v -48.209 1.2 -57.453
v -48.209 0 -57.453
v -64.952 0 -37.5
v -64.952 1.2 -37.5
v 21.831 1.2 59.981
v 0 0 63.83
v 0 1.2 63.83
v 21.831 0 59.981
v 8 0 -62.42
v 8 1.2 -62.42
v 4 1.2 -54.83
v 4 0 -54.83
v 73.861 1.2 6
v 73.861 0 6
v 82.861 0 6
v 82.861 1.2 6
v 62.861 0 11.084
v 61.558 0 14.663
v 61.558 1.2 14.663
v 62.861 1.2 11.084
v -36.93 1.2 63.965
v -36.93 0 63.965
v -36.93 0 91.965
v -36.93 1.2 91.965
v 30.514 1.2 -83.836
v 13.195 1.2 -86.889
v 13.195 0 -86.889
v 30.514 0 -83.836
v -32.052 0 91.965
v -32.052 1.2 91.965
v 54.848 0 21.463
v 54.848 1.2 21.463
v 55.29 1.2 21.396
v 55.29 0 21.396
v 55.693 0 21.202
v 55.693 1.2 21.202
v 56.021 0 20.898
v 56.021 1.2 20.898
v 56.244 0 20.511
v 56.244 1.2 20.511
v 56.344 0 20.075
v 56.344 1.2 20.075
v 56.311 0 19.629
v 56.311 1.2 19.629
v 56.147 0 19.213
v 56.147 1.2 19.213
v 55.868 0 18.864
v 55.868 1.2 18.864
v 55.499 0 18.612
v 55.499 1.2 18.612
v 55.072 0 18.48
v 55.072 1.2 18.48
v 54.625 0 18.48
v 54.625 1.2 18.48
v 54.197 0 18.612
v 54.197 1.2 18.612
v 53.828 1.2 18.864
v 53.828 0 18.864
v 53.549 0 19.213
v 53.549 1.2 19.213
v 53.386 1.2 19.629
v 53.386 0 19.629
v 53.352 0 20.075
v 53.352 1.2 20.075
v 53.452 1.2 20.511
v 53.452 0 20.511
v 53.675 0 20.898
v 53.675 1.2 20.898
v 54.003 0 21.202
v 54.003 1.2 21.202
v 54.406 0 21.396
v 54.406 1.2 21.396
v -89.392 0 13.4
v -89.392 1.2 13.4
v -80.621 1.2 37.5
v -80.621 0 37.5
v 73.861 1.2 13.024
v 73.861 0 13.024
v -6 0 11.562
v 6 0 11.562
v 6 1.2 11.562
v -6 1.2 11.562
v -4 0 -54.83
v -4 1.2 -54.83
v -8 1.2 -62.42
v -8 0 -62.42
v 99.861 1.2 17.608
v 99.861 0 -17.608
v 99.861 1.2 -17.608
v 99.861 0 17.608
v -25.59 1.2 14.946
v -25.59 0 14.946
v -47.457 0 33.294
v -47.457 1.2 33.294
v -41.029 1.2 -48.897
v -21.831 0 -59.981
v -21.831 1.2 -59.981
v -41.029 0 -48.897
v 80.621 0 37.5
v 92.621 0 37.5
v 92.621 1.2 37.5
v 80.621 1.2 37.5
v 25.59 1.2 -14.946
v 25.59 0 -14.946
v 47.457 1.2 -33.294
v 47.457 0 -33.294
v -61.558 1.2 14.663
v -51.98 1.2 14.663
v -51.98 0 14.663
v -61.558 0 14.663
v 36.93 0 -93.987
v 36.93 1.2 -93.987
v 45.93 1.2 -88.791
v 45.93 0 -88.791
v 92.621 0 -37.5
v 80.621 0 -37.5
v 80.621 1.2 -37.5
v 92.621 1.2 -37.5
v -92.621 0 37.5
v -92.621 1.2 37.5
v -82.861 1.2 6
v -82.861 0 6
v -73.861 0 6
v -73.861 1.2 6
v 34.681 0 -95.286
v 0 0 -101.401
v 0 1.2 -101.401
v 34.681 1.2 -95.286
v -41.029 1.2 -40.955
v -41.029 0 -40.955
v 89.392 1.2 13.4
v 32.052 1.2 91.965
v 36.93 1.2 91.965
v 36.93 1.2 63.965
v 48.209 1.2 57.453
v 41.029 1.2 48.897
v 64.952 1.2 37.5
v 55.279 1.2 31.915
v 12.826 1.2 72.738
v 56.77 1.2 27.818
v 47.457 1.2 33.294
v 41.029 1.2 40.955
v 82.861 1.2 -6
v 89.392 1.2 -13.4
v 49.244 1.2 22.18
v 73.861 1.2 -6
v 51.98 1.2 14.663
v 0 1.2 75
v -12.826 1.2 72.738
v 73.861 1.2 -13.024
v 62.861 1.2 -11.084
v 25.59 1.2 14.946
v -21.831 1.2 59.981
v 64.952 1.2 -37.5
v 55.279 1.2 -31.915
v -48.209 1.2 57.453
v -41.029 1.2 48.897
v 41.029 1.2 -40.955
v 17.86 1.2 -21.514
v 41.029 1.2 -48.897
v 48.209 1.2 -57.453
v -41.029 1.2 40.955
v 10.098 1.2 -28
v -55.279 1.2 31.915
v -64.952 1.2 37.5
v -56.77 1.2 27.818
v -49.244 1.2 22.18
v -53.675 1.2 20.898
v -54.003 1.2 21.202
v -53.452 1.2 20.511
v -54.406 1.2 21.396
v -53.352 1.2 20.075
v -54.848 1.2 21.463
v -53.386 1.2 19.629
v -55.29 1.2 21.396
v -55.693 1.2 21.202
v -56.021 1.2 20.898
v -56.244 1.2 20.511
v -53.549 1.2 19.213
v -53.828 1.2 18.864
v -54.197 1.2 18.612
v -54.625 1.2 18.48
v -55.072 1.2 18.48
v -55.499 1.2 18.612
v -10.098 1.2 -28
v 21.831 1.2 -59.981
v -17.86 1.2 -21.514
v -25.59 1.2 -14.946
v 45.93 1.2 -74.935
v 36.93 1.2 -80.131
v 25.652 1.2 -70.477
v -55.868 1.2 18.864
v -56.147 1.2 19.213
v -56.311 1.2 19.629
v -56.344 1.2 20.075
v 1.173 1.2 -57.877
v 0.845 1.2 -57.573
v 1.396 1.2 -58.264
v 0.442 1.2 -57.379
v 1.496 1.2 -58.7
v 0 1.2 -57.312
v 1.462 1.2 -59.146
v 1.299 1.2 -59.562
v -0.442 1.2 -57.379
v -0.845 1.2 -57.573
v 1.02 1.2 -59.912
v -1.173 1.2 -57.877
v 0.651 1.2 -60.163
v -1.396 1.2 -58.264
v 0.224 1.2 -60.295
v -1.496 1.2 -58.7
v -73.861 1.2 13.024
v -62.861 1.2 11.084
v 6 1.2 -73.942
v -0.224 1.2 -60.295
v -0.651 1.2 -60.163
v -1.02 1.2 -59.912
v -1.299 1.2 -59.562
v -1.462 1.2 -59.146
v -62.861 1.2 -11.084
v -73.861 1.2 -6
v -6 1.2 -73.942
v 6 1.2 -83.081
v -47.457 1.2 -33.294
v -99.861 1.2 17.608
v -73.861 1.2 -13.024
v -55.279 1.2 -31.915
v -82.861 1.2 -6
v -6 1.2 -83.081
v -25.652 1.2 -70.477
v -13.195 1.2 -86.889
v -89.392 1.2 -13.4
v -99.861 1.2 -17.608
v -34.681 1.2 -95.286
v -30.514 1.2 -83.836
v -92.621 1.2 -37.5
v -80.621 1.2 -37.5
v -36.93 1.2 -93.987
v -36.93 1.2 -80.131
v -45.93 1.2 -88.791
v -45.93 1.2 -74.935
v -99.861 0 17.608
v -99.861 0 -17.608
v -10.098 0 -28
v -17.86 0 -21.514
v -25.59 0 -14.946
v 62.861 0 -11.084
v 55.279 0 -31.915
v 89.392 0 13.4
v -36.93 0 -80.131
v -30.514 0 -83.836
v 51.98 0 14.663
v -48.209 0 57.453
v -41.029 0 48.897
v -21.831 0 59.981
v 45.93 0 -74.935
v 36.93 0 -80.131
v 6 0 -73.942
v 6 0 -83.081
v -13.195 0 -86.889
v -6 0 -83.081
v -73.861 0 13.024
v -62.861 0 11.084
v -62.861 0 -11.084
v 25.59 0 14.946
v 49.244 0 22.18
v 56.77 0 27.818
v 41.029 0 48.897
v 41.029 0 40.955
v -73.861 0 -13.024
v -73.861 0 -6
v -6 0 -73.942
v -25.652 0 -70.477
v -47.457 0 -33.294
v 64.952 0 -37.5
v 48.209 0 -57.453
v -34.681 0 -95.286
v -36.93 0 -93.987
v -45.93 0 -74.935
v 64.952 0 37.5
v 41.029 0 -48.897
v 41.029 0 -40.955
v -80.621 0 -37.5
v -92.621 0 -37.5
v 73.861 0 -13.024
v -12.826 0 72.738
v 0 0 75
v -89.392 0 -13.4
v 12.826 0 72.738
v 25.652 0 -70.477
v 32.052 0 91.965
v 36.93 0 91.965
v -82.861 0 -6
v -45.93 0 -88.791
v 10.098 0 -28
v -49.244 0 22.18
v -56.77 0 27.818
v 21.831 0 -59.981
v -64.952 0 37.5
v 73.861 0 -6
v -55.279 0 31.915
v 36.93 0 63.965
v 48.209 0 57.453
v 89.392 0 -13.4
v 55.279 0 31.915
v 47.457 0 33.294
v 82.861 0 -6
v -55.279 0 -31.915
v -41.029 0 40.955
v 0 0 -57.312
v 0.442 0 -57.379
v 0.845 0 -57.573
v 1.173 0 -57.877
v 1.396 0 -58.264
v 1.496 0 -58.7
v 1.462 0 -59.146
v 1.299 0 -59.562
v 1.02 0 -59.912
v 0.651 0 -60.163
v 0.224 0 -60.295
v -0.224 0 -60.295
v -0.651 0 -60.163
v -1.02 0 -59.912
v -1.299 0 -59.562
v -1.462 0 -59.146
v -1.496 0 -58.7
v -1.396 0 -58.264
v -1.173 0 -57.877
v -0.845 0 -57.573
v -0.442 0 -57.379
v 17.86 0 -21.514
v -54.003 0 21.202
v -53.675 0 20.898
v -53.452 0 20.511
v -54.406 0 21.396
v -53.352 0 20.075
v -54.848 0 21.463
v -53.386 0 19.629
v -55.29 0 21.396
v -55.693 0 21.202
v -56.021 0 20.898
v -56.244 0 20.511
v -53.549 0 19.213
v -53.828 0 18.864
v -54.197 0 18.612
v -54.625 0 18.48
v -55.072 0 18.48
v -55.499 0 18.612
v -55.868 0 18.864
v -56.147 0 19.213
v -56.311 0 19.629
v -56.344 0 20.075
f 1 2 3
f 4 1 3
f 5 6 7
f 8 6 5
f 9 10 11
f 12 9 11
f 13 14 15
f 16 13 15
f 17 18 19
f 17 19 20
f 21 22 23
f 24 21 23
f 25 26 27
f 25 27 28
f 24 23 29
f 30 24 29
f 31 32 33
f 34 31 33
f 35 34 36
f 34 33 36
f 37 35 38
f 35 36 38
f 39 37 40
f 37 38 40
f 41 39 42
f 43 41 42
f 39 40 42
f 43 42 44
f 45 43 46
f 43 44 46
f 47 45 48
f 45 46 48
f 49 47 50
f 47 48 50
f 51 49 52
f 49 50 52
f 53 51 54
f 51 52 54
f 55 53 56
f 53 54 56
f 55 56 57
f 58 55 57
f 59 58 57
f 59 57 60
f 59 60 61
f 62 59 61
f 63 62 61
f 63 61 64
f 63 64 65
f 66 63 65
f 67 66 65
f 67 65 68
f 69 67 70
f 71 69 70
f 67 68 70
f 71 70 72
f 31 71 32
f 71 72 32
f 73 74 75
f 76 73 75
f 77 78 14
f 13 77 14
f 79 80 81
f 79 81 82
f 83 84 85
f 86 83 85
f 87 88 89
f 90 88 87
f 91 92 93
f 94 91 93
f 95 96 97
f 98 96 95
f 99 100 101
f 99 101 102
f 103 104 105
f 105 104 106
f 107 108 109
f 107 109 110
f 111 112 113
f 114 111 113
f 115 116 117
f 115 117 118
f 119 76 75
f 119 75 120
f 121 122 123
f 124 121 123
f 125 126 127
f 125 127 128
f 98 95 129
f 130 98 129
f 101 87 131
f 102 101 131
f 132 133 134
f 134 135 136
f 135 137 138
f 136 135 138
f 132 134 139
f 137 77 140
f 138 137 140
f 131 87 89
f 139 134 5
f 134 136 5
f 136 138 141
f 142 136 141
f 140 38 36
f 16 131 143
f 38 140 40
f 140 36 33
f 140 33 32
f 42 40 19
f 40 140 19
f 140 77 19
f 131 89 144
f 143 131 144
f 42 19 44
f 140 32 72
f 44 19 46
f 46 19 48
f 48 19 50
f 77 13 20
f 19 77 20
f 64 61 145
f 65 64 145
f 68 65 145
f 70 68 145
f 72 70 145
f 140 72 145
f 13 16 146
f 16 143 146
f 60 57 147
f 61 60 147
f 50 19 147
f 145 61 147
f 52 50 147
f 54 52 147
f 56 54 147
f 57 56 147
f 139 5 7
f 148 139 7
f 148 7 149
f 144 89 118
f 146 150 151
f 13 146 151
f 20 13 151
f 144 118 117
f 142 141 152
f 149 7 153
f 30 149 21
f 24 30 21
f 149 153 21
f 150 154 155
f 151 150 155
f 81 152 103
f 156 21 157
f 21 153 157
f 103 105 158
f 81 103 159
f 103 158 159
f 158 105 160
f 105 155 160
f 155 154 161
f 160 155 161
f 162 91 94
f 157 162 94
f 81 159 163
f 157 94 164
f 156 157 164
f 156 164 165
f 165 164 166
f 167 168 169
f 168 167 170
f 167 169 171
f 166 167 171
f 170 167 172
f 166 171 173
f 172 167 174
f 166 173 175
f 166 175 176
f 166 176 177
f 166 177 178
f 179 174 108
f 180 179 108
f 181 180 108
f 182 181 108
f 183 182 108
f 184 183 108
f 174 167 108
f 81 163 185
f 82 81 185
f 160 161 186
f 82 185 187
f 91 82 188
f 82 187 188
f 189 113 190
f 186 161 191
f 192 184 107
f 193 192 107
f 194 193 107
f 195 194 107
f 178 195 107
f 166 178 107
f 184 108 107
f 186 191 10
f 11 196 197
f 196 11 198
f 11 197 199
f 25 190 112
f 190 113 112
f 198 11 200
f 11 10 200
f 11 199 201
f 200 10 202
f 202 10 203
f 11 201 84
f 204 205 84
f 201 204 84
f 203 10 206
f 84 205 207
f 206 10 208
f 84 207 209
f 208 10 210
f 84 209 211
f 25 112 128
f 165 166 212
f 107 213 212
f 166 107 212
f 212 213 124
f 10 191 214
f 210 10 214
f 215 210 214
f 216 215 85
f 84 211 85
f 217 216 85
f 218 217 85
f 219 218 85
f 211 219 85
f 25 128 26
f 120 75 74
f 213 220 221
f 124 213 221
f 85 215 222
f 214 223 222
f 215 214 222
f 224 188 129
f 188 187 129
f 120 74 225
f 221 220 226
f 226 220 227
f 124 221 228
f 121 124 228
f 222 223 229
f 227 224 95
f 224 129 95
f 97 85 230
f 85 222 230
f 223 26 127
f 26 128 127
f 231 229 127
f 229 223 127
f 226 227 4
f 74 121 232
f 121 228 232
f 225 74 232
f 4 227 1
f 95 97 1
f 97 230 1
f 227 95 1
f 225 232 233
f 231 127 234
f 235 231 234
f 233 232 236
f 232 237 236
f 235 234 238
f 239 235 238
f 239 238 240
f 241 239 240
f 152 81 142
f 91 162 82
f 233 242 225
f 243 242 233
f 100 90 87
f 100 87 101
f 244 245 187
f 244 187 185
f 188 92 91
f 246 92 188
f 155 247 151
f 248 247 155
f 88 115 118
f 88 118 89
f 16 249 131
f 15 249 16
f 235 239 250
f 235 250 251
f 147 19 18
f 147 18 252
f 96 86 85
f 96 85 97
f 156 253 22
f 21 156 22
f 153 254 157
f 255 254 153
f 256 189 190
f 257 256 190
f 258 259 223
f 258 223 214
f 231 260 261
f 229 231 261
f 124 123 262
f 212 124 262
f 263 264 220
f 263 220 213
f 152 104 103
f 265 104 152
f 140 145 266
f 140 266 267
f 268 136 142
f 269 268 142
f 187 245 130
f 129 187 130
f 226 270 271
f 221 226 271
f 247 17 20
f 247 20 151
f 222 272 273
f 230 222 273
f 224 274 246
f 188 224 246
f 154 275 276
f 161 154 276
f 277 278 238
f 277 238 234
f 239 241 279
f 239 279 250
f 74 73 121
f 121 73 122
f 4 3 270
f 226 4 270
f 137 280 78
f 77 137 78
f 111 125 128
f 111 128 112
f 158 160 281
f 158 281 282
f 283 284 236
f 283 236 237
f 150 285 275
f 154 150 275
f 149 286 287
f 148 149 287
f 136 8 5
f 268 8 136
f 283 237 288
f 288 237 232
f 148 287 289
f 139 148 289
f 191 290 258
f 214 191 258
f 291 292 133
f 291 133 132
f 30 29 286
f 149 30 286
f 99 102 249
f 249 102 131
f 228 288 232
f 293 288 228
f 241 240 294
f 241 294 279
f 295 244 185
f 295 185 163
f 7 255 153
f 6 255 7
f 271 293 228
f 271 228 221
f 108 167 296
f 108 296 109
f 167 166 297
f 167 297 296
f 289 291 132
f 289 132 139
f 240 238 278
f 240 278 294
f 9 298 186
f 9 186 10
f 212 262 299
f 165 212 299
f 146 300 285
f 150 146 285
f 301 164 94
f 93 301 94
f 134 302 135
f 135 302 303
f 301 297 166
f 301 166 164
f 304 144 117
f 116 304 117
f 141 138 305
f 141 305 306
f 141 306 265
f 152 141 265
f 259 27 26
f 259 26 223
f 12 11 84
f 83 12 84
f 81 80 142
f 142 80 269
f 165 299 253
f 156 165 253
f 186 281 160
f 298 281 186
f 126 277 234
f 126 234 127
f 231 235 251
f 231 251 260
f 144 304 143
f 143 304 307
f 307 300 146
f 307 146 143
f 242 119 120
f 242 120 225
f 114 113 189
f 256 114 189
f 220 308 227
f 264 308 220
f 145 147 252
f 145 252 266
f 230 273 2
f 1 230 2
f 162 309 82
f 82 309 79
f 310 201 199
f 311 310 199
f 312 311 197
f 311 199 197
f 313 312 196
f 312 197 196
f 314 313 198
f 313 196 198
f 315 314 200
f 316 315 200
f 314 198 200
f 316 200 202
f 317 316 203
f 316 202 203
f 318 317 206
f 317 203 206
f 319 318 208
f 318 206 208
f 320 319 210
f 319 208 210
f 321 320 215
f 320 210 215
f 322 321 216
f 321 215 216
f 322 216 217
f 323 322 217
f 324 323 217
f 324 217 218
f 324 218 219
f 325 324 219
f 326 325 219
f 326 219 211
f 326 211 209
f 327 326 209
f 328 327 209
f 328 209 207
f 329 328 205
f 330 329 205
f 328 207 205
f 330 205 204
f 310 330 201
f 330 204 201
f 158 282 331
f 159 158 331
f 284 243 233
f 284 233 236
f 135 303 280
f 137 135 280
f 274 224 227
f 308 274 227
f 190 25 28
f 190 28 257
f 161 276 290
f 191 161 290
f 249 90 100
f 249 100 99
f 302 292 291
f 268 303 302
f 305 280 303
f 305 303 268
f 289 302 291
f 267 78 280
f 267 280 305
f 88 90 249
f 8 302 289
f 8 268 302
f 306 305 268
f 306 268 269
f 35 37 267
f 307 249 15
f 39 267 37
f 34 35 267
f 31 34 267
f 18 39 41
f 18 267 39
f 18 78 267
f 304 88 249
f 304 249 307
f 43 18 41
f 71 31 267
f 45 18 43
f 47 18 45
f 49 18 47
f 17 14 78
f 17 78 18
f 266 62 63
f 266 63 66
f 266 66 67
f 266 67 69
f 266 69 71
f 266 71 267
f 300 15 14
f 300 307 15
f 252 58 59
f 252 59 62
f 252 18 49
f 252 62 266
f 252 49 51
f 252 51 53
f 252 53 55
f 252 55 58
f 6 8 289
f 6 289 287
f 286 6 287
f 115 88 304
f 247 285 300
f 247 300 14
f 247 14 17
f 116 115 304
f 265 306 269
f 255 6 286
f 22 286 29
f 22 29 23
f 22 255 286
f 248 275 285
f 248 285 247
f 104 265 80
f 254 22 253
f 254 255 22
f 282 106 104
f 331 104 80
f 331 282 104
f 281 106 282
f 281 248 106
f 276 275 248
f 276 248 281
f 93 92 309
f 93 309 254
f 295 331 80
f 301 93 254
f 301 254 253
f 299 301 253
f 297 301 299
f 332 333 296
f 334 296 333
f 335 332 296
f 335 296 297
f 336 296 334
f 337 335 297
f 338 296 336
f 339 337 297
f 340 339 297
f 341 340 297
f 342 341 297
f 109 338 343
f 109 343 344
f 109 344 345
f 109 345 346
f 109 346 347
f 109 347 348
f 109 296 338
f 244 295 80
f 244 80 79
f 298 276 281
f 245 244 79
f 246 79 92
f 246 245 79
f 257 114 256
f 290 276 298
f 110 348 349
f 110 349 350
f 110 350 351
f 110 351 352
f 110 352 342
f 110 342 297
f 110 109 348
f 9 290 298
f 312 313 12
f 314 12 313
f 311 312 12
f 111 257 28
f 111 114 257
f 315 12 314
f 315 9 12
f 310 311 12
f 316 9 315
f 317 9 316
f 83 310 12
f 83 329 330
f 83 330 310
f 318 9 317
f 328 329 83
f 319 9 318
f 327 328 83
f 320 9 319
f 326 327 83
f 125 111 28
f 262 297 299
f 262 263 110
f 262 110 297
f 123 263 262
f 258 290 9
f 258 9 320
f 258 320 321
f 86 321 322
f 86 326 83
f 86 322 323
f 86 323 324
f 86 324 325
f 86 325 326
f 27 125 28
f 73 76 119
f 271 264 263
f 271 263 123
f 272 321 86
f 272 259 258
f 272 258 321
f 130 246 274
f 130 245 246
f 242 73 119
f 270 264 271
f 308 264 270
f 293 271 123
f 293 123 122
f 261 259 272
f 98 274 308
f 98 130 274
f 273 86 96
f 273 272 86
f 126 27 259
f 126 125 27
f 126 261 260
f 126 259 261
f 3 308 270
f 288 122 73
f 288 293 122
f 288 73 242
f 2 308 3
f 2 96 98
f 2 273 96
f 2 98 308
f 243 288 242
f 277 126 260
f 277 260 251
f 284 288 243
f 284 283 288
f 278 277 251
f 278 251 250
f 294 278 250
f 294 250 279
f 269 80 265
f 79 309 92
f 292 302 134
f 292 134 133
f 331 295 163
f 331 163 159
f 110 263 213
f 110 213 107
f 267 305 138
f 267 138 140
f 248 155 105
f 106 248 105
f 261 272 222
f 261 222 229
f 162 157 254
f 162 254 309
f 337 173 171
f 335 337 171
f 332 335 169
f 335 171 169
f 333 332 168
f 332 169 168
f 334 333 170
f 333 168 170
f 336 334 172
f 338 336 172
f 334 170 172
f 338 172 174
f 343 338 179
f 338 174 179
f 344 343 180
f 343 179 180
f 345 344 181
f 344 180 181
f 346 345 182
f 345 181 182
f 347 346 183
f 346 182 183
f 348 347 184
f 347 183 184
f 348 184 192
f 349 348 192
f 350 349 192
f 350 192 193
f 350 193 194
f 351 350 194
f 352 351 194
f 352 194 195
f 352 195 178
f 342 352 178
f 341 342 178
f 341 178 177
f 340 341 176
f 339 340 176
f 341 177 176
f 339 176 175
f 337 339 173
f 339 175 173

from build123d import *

# Parameters (mm, degrees)
BOSS_EXTRUDE1_DEPTH    = 1.2
BOSS_EXTRUDE17_DEPTH   = 1.2
BOSS_EXTRUDE17_2_DEPTH = 1.2
BOSS_EXTRUDE17_3_DEPTH = 1.2
SKETCH18_W             = 18
SKETCH18_H             = 12
BOSS_EXTRUDE18_DEPTH   = 1.2
BOSS_EXTRUDE19_DEPTH   = 1.2
BOSS_EXTRUDE20_DEPTH   = 1.2
BOSS_EXTRUDE21_DEPTH   = 1.2
BOSS_EXTRUDE22_DEPTH   = 1.2
BOSS_EXTRUDE23_DEPTH   = 1.2
BOSS_EXTRUDE26_DEPTH   = 1.2
BOSS_EXTRUDE29_DEPTH   = 1.2
BOSS_EXTRUDE30_DEPTH   = 1.2
BOSS_EXTRUDE31_DEPTH   = 1.2
SKETCH37_R             = 1.5
CUT_EXTRUDE1_DEPTH     = 1.2
SKETCH38_R             = 1.5
CUT_EXTRUDE2_DEPTH     = 1.2
BOSS_EXTRUDE32_DEPTH   = 1.2


with BuildPart() as part:
    # Sketch1 → Boss-Extrude1 (new body)
    with BuildSketch(Plane(origin=(0, 0, 0), x_dir=(1, 0, 0), z_dir=(0, 1, 0))):
        Polygon((0, 75), (-25.651510749, 70.476946559), (-48.209070726, 57.453333234), (-64.951905284, 37.5), (-73.860581476, 13.023613325), (-73.860581476, -13.023613325), (-64.951905284, -37.5), (-48.209070726, -57.453333234), (-25.651510749, -70.476946559), (0, -75), (25.651510749, -70.476946559), (48.209070726, -57.453333234), (64.951905284, -37.5), (73.860581476, -13.023613325), (73.860581476, 13.023613325), (64.951905284, 37.5), (48.209070726, 57.453333234), (25.651510749, 70.476946559), align=None)
        Polygon((0, 63.830307269), (-21.831250841, 59.980868723), (-41.029330635, 48.896852186), (-55.278667627, 31.915153635), (-62.860581476, 11.084016537), (-62.860581476, -11.084016537), (-55.278667627, -31.915153635), (-41.029330635, -48.896852186), (-21.831250841, -59.980868723), (0, -63.830307269), (21.831250841, -59.980868723), (41.029330635, -48.896852186), (55.278667627, -31.915153635), (62.860581476, -11.084016537), (62.860581476, 11.084016537), (55.278667627, 31.915153635), (41.029330635, 48.896852186), (21.831250841, 59.980868723), align=None, mode=Mode.SUBTRACT)
    extrude(amount=BOSS_EXTRUDE1_DEPTH)



with BuildPart() as body_2:
    # Sketch15 → Boss-Extrude17 (new body)
    with BuildSketch(Plane.XZ):
        Polygon((0, -101.401091909), (34.681215988, -95.285857807), (36.930290738, -93.987353894), (36.930290738, -84.749749587), (31.902845145, -87.652346653), (0, -93.277679014), (-31.902845145, -87.652346653), (-36.930290738, -84.749749587), (-36.930290738, -93.987353894), (-34.681215988, -95.285857807), align=None)
    extrude(amount=-BOSS_EXTRUDE17_DEPTH)


with BuildPart() as body_3:
    # Sketch15 → Boss-Extrude17 2 (new body)
    with BuildSketch(Plane.XZ):
        Polygon((92.620527368, -37.5), (99.860581476, -17.608114823), (99.860581476, 17.608114823), (92.620527368, 37.5), (84.107105188, 37.5), (91.860581476, 16.197498978), (91.860581476, -16.197498978), (84.107105188, -37.5), align=None)
    extrude(amount=-BOSS_EXTRUDE17_2_DEPTH)


with BuildPart() as body_4:
    # Sketch15 → Boss-Extrude17 3 (new body)
    with BuildSketch(Plane.XZ):
        Polygon((-92.620527368, 37.5), (-99.860581476, 17.608114823), (-99.860581476, -17.608114823), (-92.620527368, -37.5), (-84.107105188, -37.5), (-91.860581476, -16.197498978), (-91.860581476, 16.197498978), (-84.107105188, 37.5), align=None)
    extrude(amount=-BOSS_EXTRUDE17_3_DEPTH)


with BuildPart() as part_1:
    add(part.part)

    add(body_2.part)  # Boss-Extrude18 merges body 2

    add(body_3.part)  # Boss-Extrude18 merges body 3

    add(body_4.part)  # Boss-Extrude18 merges body 4
    # Sketch18 → Boss-Extrude18 (add)
    with BuildSketch(Plane.XZ):
        with Locations((-82.860581476, 0)):
            Rectangle(SKETCH18_W, SKETCH18_H)
        with Locations((82.860581476, 0)):
            Rectangle(SKETCH18_W, SKETCH18_H)
        Polygon((-6, -73.942038116), (-6, -92.21971713), (0, -93.277679014), (6, -92.21971713), (6, -73.942038116), (0, -75), align=None)
    extrude(amount=-BOSS_EXTRUDE18_DEPTH)

    # Sketch19 → Boss-Extrude19 (add)
    with BuildSketch(Plane.XZ):
        Polygon((-91.860581476, 16.197498978), (-82.860581476, 6), (-91.860581476, 6), align=None)
        Polygon((-91.860581476, -16.197498978), (-82.860581476, -6), (-91.860581476, -6), align=None)
        Polygon((91.860581476, 16.197498978), (82.860581476, 6), (91.860581476, 6), align=None)
        Polygon((91.860581476, -16.197498978), (82.860581476, -6), (91.860581476, -6), align=None)
        Polygon((18.951422573, -89.936031892), (6, -83.080877623), (6, -92.21971713), align=None)
        Polygon((-6, -83.080877623), (-6, -92.21971713), (-18.951422573, -89.936031892), align=None)
    extrude(amount=-BOSS_EXTRUDE19_DEPTH)

    # Sketch20 → Boss-Extrude20 (add)
    with BuildSketch(Plane.XZ):
        Polygon((-36.930290738, 63.965139896), (-36.930290738, 91.965139896), (-32.052421992, 91.965139896), (-12.825755375, 72.738473279), (-25.651510749, 70.476946559), align=None)
        Polygon((36.930290738, 63.965139896), (36.930290738, 91.965139896), (32.052421992, 91.965139896), (12.825755375, 72.738473279), (25.651510749, 70.476946559), align=None)
    extrude(amount=-BOSS_EXTRUDE20_DEPTH)

    # Sketch23 → Boss-Extrude21 (add)
    with BuildSketch(Plane(origin=(0, 1.2, 0), x_dir=(1, 0, 0), z_dir=(0, 1, 0))):
        Polygon((-92.620527368, 37.5), (-80.620527368, 37.5), (-89.392030332, 13.400493671), (-89.392030332, -13.400493671), (-80.620527368, -37.5), (-92.620527368, -37.5), (-99.860581476, -17.608114823), (-99.860581476, 17.608114823), align=None)
        Polygon((80.620527368, -37.5), (89.392030332, -13.400493671), (89.392030332, 13.400493671), (80.620527368, 37.5), (92.620527368, 37.5), (99.860581476, 17.608114823), (99.860581476, -17.608114823), (92.620527368, -37.5), align=None)
    extrude(amount=-BOSS_EXTRUDE21_DEPTH)

    # Sketch24 → Boss-Extrude22 (add)
    with BuildSketch(Plane(origin=(0, 1.2, 0), x_dir=(1, 0, 0), z_dir=(0, 1, 0))):
        Polygon((-36.930290738, 93.987353894), (-36.930290738, 80.130947434), (-30.513659724, 83.835591077), (-13.195234763, 86.889296661), (13.195234763, 86.889296661), (30.513659724, 83.835591077), (36.930290738, 80.130947434), (36.930290738, 93.987353894), (34.681215988, 95.285857807), (0, 101.401091909), (-34.681215988, 95.285857807), align=None)
    extrude(amount=-BOSS_EXTRUDE22_DEPTH)

    # Sketch26 → Boss-Extrude23 (add)
    with BuildSketch(Plane(origin=(0, 1.2, 0), x_dir=(1, 0, 0), z_dir=(0, 1, 0))):
        Polygon((-36.930290738, 93.987353894), (-45.930290738, 88.791201472), (-45.930290738, 74.934795011), (-36.930290738, 80.130947434), align=None)
        Polygon((36.930290738, 93.987353894), (45.930290738, 88.791201472), (45.930290738, 74.934795011), (36.930290738, 80.130947434), align=None)
    extrude(amount=-BOSS_EXTRUDE23_DEPTH)

    # Sketch27 → Boss-Extrude26 (add)
    with BuildSketch(Plane.XZ):
        Polygon((-44.940061082, 44.236225126), (0, 6.527036447), (44.940061082, 44.236225126), (51.367937179, 36.575780695), (7.778619134, 0), (51.367937179, -36.575780695), (44.940061082, -44.236225126), (0, -6.527036447), (-44.940061082, -44.236225126), (-51.367937179, -36.575780695), (-7.778619134, 0), (-51.367937179, 36.575780695), align=None)
    extrude(amount=-BOSS_EXTRUDE26_DEPTH)

    # Sketch31 → Boss-Extrude29 (add)
    with BuildSketch(Plane.XZ):
        Polygon((-10.098423643, -28), (10.098423643, -28), (25.590481458, -15.054072893), (25.590481458, 14.945927107), (6, 11.561634234), (-6, 11.561634234), (-25.590481458, 14.945927107), (-25.590481458, -15.054072893), align=None)
    extrude(amount=-BOSS_EXTRUDE29_DEPTH)

    # Sketch32 → Boss-Extrude30 (add)
    with BuildSketch(Plane(origin=(0, 1.2, 0), x_dir=(1, 0, 0), z_dir=(0, 1, 0))):
        Polygon((-41.029330635, 48.896852186), (-41.029330635, 40.95473265), (-44.940061082, 44.236225126), align=None)
        Polygon((41.029330635, 48.896852186), (41.029330635, 40.95473265), (44.940061082, 44.236225126), align=None)
        Polygon((44.940061082, -44.236225126), (41.029330635, -48.896852186), (41.029330635, -40.95473265), align=None)
        Polygon((-41.029330635, -48.896852186), (-41.029330635, -40.95473265), (-44.940061082, -44.236225126), align=None)
    extrude(amount=-BOSS_EXTRUDE30_DEPTH)

    # Sketch34 → Boss-Extrude31 (add)
    with BuildSketch(Plane(origin=(0, 1.2, 0), x_dir=(1, 0, 0), z_dir=(0, 1, 0))):
        Polygon((8, 62.419691424), (4, 54.830307269), (-4, 54.830307269), (-8, 62.419691424), (0, 63.830307269), align=None)
        Polygon((-61.55807149, -14.662633313), (-56.769789483, -27.818330004), (-49.244310391, -22.180174279), (-50.612390964, -18.421403796), (-51.980471537, -14.662633313), align=None)
        Polygon((50.612390964, -18.421403796), (49.244310391, -22.180174279), (56.769789483, -27.818330004), (61.55807149, -14.662633313), (51.980471537, -14.662633313), align=None)
    extrude(amount=-BOSS_EXTRUDE31_DEPTH)

    # Sketch37 → Cut-Extrude1 (cut)
    with BuildSketch(Plane(origin=(0, 1.2, 0), x_dir=(1, 0, 0), z_dir=(0, 1, 0))):
        with Locations(Location((-54.84814578, -19.96309247, 0), (0, 0, 270))):
            Circle(SKETCH37_R)
        with Locations(Location((54.84814578, -19.96309247, 0), (0, 0, 270))):
            Circle(SKETCH37_R)
    extrude(amount=-CUT_EXTRUDE1_DEPTH, mode=Mode.SUBTRACT)

    # Sketch38 → Cut-Extrude2 (cut)
    with BuildSketch(Plane(origin=(0, 1.2, 0), x_dir=(1, 0, 0), z_dir=(0, 1, 0))):
        with Locations(Location((0, 58.81204127, 0), (0, 0, 270))):
            Circle(SKETCH38_R)
    extrude(amount=-CUT_EXTRUDE2_DEPTH, mode=Mode.SUBTRACT)

    # Sketch39 → Boss-Extrude32 (add)
    with BuildSketch(Plane(origin=(0, 1.2, 0), x_dir=(1, 0, 0), z_dir=(0, 1, 0))):
        Polygon((-51.367937179, 36.575780695), (-47.457206732, 33.294288219), (-55.278667627, 31.915153635), align=None)
        Polygon((51.367937179, 36.575780695), (55.278667627, 31.915153635), (47.457206732, 33.294288219), align=None)
        Polygon((51.367937179, -36.575780695), (55.278667627, -31.915153635), (47.457206732, -33.294288219), align=None)
        Polygon((-47.457206732, -33.294288219), (-51.367937179, -36.575780695), (-55.278667627, -31.915153635), align=None)
    extrude(amount=-BOSS_EXTRUDE32_DEPTH)


solid = part_1.part
